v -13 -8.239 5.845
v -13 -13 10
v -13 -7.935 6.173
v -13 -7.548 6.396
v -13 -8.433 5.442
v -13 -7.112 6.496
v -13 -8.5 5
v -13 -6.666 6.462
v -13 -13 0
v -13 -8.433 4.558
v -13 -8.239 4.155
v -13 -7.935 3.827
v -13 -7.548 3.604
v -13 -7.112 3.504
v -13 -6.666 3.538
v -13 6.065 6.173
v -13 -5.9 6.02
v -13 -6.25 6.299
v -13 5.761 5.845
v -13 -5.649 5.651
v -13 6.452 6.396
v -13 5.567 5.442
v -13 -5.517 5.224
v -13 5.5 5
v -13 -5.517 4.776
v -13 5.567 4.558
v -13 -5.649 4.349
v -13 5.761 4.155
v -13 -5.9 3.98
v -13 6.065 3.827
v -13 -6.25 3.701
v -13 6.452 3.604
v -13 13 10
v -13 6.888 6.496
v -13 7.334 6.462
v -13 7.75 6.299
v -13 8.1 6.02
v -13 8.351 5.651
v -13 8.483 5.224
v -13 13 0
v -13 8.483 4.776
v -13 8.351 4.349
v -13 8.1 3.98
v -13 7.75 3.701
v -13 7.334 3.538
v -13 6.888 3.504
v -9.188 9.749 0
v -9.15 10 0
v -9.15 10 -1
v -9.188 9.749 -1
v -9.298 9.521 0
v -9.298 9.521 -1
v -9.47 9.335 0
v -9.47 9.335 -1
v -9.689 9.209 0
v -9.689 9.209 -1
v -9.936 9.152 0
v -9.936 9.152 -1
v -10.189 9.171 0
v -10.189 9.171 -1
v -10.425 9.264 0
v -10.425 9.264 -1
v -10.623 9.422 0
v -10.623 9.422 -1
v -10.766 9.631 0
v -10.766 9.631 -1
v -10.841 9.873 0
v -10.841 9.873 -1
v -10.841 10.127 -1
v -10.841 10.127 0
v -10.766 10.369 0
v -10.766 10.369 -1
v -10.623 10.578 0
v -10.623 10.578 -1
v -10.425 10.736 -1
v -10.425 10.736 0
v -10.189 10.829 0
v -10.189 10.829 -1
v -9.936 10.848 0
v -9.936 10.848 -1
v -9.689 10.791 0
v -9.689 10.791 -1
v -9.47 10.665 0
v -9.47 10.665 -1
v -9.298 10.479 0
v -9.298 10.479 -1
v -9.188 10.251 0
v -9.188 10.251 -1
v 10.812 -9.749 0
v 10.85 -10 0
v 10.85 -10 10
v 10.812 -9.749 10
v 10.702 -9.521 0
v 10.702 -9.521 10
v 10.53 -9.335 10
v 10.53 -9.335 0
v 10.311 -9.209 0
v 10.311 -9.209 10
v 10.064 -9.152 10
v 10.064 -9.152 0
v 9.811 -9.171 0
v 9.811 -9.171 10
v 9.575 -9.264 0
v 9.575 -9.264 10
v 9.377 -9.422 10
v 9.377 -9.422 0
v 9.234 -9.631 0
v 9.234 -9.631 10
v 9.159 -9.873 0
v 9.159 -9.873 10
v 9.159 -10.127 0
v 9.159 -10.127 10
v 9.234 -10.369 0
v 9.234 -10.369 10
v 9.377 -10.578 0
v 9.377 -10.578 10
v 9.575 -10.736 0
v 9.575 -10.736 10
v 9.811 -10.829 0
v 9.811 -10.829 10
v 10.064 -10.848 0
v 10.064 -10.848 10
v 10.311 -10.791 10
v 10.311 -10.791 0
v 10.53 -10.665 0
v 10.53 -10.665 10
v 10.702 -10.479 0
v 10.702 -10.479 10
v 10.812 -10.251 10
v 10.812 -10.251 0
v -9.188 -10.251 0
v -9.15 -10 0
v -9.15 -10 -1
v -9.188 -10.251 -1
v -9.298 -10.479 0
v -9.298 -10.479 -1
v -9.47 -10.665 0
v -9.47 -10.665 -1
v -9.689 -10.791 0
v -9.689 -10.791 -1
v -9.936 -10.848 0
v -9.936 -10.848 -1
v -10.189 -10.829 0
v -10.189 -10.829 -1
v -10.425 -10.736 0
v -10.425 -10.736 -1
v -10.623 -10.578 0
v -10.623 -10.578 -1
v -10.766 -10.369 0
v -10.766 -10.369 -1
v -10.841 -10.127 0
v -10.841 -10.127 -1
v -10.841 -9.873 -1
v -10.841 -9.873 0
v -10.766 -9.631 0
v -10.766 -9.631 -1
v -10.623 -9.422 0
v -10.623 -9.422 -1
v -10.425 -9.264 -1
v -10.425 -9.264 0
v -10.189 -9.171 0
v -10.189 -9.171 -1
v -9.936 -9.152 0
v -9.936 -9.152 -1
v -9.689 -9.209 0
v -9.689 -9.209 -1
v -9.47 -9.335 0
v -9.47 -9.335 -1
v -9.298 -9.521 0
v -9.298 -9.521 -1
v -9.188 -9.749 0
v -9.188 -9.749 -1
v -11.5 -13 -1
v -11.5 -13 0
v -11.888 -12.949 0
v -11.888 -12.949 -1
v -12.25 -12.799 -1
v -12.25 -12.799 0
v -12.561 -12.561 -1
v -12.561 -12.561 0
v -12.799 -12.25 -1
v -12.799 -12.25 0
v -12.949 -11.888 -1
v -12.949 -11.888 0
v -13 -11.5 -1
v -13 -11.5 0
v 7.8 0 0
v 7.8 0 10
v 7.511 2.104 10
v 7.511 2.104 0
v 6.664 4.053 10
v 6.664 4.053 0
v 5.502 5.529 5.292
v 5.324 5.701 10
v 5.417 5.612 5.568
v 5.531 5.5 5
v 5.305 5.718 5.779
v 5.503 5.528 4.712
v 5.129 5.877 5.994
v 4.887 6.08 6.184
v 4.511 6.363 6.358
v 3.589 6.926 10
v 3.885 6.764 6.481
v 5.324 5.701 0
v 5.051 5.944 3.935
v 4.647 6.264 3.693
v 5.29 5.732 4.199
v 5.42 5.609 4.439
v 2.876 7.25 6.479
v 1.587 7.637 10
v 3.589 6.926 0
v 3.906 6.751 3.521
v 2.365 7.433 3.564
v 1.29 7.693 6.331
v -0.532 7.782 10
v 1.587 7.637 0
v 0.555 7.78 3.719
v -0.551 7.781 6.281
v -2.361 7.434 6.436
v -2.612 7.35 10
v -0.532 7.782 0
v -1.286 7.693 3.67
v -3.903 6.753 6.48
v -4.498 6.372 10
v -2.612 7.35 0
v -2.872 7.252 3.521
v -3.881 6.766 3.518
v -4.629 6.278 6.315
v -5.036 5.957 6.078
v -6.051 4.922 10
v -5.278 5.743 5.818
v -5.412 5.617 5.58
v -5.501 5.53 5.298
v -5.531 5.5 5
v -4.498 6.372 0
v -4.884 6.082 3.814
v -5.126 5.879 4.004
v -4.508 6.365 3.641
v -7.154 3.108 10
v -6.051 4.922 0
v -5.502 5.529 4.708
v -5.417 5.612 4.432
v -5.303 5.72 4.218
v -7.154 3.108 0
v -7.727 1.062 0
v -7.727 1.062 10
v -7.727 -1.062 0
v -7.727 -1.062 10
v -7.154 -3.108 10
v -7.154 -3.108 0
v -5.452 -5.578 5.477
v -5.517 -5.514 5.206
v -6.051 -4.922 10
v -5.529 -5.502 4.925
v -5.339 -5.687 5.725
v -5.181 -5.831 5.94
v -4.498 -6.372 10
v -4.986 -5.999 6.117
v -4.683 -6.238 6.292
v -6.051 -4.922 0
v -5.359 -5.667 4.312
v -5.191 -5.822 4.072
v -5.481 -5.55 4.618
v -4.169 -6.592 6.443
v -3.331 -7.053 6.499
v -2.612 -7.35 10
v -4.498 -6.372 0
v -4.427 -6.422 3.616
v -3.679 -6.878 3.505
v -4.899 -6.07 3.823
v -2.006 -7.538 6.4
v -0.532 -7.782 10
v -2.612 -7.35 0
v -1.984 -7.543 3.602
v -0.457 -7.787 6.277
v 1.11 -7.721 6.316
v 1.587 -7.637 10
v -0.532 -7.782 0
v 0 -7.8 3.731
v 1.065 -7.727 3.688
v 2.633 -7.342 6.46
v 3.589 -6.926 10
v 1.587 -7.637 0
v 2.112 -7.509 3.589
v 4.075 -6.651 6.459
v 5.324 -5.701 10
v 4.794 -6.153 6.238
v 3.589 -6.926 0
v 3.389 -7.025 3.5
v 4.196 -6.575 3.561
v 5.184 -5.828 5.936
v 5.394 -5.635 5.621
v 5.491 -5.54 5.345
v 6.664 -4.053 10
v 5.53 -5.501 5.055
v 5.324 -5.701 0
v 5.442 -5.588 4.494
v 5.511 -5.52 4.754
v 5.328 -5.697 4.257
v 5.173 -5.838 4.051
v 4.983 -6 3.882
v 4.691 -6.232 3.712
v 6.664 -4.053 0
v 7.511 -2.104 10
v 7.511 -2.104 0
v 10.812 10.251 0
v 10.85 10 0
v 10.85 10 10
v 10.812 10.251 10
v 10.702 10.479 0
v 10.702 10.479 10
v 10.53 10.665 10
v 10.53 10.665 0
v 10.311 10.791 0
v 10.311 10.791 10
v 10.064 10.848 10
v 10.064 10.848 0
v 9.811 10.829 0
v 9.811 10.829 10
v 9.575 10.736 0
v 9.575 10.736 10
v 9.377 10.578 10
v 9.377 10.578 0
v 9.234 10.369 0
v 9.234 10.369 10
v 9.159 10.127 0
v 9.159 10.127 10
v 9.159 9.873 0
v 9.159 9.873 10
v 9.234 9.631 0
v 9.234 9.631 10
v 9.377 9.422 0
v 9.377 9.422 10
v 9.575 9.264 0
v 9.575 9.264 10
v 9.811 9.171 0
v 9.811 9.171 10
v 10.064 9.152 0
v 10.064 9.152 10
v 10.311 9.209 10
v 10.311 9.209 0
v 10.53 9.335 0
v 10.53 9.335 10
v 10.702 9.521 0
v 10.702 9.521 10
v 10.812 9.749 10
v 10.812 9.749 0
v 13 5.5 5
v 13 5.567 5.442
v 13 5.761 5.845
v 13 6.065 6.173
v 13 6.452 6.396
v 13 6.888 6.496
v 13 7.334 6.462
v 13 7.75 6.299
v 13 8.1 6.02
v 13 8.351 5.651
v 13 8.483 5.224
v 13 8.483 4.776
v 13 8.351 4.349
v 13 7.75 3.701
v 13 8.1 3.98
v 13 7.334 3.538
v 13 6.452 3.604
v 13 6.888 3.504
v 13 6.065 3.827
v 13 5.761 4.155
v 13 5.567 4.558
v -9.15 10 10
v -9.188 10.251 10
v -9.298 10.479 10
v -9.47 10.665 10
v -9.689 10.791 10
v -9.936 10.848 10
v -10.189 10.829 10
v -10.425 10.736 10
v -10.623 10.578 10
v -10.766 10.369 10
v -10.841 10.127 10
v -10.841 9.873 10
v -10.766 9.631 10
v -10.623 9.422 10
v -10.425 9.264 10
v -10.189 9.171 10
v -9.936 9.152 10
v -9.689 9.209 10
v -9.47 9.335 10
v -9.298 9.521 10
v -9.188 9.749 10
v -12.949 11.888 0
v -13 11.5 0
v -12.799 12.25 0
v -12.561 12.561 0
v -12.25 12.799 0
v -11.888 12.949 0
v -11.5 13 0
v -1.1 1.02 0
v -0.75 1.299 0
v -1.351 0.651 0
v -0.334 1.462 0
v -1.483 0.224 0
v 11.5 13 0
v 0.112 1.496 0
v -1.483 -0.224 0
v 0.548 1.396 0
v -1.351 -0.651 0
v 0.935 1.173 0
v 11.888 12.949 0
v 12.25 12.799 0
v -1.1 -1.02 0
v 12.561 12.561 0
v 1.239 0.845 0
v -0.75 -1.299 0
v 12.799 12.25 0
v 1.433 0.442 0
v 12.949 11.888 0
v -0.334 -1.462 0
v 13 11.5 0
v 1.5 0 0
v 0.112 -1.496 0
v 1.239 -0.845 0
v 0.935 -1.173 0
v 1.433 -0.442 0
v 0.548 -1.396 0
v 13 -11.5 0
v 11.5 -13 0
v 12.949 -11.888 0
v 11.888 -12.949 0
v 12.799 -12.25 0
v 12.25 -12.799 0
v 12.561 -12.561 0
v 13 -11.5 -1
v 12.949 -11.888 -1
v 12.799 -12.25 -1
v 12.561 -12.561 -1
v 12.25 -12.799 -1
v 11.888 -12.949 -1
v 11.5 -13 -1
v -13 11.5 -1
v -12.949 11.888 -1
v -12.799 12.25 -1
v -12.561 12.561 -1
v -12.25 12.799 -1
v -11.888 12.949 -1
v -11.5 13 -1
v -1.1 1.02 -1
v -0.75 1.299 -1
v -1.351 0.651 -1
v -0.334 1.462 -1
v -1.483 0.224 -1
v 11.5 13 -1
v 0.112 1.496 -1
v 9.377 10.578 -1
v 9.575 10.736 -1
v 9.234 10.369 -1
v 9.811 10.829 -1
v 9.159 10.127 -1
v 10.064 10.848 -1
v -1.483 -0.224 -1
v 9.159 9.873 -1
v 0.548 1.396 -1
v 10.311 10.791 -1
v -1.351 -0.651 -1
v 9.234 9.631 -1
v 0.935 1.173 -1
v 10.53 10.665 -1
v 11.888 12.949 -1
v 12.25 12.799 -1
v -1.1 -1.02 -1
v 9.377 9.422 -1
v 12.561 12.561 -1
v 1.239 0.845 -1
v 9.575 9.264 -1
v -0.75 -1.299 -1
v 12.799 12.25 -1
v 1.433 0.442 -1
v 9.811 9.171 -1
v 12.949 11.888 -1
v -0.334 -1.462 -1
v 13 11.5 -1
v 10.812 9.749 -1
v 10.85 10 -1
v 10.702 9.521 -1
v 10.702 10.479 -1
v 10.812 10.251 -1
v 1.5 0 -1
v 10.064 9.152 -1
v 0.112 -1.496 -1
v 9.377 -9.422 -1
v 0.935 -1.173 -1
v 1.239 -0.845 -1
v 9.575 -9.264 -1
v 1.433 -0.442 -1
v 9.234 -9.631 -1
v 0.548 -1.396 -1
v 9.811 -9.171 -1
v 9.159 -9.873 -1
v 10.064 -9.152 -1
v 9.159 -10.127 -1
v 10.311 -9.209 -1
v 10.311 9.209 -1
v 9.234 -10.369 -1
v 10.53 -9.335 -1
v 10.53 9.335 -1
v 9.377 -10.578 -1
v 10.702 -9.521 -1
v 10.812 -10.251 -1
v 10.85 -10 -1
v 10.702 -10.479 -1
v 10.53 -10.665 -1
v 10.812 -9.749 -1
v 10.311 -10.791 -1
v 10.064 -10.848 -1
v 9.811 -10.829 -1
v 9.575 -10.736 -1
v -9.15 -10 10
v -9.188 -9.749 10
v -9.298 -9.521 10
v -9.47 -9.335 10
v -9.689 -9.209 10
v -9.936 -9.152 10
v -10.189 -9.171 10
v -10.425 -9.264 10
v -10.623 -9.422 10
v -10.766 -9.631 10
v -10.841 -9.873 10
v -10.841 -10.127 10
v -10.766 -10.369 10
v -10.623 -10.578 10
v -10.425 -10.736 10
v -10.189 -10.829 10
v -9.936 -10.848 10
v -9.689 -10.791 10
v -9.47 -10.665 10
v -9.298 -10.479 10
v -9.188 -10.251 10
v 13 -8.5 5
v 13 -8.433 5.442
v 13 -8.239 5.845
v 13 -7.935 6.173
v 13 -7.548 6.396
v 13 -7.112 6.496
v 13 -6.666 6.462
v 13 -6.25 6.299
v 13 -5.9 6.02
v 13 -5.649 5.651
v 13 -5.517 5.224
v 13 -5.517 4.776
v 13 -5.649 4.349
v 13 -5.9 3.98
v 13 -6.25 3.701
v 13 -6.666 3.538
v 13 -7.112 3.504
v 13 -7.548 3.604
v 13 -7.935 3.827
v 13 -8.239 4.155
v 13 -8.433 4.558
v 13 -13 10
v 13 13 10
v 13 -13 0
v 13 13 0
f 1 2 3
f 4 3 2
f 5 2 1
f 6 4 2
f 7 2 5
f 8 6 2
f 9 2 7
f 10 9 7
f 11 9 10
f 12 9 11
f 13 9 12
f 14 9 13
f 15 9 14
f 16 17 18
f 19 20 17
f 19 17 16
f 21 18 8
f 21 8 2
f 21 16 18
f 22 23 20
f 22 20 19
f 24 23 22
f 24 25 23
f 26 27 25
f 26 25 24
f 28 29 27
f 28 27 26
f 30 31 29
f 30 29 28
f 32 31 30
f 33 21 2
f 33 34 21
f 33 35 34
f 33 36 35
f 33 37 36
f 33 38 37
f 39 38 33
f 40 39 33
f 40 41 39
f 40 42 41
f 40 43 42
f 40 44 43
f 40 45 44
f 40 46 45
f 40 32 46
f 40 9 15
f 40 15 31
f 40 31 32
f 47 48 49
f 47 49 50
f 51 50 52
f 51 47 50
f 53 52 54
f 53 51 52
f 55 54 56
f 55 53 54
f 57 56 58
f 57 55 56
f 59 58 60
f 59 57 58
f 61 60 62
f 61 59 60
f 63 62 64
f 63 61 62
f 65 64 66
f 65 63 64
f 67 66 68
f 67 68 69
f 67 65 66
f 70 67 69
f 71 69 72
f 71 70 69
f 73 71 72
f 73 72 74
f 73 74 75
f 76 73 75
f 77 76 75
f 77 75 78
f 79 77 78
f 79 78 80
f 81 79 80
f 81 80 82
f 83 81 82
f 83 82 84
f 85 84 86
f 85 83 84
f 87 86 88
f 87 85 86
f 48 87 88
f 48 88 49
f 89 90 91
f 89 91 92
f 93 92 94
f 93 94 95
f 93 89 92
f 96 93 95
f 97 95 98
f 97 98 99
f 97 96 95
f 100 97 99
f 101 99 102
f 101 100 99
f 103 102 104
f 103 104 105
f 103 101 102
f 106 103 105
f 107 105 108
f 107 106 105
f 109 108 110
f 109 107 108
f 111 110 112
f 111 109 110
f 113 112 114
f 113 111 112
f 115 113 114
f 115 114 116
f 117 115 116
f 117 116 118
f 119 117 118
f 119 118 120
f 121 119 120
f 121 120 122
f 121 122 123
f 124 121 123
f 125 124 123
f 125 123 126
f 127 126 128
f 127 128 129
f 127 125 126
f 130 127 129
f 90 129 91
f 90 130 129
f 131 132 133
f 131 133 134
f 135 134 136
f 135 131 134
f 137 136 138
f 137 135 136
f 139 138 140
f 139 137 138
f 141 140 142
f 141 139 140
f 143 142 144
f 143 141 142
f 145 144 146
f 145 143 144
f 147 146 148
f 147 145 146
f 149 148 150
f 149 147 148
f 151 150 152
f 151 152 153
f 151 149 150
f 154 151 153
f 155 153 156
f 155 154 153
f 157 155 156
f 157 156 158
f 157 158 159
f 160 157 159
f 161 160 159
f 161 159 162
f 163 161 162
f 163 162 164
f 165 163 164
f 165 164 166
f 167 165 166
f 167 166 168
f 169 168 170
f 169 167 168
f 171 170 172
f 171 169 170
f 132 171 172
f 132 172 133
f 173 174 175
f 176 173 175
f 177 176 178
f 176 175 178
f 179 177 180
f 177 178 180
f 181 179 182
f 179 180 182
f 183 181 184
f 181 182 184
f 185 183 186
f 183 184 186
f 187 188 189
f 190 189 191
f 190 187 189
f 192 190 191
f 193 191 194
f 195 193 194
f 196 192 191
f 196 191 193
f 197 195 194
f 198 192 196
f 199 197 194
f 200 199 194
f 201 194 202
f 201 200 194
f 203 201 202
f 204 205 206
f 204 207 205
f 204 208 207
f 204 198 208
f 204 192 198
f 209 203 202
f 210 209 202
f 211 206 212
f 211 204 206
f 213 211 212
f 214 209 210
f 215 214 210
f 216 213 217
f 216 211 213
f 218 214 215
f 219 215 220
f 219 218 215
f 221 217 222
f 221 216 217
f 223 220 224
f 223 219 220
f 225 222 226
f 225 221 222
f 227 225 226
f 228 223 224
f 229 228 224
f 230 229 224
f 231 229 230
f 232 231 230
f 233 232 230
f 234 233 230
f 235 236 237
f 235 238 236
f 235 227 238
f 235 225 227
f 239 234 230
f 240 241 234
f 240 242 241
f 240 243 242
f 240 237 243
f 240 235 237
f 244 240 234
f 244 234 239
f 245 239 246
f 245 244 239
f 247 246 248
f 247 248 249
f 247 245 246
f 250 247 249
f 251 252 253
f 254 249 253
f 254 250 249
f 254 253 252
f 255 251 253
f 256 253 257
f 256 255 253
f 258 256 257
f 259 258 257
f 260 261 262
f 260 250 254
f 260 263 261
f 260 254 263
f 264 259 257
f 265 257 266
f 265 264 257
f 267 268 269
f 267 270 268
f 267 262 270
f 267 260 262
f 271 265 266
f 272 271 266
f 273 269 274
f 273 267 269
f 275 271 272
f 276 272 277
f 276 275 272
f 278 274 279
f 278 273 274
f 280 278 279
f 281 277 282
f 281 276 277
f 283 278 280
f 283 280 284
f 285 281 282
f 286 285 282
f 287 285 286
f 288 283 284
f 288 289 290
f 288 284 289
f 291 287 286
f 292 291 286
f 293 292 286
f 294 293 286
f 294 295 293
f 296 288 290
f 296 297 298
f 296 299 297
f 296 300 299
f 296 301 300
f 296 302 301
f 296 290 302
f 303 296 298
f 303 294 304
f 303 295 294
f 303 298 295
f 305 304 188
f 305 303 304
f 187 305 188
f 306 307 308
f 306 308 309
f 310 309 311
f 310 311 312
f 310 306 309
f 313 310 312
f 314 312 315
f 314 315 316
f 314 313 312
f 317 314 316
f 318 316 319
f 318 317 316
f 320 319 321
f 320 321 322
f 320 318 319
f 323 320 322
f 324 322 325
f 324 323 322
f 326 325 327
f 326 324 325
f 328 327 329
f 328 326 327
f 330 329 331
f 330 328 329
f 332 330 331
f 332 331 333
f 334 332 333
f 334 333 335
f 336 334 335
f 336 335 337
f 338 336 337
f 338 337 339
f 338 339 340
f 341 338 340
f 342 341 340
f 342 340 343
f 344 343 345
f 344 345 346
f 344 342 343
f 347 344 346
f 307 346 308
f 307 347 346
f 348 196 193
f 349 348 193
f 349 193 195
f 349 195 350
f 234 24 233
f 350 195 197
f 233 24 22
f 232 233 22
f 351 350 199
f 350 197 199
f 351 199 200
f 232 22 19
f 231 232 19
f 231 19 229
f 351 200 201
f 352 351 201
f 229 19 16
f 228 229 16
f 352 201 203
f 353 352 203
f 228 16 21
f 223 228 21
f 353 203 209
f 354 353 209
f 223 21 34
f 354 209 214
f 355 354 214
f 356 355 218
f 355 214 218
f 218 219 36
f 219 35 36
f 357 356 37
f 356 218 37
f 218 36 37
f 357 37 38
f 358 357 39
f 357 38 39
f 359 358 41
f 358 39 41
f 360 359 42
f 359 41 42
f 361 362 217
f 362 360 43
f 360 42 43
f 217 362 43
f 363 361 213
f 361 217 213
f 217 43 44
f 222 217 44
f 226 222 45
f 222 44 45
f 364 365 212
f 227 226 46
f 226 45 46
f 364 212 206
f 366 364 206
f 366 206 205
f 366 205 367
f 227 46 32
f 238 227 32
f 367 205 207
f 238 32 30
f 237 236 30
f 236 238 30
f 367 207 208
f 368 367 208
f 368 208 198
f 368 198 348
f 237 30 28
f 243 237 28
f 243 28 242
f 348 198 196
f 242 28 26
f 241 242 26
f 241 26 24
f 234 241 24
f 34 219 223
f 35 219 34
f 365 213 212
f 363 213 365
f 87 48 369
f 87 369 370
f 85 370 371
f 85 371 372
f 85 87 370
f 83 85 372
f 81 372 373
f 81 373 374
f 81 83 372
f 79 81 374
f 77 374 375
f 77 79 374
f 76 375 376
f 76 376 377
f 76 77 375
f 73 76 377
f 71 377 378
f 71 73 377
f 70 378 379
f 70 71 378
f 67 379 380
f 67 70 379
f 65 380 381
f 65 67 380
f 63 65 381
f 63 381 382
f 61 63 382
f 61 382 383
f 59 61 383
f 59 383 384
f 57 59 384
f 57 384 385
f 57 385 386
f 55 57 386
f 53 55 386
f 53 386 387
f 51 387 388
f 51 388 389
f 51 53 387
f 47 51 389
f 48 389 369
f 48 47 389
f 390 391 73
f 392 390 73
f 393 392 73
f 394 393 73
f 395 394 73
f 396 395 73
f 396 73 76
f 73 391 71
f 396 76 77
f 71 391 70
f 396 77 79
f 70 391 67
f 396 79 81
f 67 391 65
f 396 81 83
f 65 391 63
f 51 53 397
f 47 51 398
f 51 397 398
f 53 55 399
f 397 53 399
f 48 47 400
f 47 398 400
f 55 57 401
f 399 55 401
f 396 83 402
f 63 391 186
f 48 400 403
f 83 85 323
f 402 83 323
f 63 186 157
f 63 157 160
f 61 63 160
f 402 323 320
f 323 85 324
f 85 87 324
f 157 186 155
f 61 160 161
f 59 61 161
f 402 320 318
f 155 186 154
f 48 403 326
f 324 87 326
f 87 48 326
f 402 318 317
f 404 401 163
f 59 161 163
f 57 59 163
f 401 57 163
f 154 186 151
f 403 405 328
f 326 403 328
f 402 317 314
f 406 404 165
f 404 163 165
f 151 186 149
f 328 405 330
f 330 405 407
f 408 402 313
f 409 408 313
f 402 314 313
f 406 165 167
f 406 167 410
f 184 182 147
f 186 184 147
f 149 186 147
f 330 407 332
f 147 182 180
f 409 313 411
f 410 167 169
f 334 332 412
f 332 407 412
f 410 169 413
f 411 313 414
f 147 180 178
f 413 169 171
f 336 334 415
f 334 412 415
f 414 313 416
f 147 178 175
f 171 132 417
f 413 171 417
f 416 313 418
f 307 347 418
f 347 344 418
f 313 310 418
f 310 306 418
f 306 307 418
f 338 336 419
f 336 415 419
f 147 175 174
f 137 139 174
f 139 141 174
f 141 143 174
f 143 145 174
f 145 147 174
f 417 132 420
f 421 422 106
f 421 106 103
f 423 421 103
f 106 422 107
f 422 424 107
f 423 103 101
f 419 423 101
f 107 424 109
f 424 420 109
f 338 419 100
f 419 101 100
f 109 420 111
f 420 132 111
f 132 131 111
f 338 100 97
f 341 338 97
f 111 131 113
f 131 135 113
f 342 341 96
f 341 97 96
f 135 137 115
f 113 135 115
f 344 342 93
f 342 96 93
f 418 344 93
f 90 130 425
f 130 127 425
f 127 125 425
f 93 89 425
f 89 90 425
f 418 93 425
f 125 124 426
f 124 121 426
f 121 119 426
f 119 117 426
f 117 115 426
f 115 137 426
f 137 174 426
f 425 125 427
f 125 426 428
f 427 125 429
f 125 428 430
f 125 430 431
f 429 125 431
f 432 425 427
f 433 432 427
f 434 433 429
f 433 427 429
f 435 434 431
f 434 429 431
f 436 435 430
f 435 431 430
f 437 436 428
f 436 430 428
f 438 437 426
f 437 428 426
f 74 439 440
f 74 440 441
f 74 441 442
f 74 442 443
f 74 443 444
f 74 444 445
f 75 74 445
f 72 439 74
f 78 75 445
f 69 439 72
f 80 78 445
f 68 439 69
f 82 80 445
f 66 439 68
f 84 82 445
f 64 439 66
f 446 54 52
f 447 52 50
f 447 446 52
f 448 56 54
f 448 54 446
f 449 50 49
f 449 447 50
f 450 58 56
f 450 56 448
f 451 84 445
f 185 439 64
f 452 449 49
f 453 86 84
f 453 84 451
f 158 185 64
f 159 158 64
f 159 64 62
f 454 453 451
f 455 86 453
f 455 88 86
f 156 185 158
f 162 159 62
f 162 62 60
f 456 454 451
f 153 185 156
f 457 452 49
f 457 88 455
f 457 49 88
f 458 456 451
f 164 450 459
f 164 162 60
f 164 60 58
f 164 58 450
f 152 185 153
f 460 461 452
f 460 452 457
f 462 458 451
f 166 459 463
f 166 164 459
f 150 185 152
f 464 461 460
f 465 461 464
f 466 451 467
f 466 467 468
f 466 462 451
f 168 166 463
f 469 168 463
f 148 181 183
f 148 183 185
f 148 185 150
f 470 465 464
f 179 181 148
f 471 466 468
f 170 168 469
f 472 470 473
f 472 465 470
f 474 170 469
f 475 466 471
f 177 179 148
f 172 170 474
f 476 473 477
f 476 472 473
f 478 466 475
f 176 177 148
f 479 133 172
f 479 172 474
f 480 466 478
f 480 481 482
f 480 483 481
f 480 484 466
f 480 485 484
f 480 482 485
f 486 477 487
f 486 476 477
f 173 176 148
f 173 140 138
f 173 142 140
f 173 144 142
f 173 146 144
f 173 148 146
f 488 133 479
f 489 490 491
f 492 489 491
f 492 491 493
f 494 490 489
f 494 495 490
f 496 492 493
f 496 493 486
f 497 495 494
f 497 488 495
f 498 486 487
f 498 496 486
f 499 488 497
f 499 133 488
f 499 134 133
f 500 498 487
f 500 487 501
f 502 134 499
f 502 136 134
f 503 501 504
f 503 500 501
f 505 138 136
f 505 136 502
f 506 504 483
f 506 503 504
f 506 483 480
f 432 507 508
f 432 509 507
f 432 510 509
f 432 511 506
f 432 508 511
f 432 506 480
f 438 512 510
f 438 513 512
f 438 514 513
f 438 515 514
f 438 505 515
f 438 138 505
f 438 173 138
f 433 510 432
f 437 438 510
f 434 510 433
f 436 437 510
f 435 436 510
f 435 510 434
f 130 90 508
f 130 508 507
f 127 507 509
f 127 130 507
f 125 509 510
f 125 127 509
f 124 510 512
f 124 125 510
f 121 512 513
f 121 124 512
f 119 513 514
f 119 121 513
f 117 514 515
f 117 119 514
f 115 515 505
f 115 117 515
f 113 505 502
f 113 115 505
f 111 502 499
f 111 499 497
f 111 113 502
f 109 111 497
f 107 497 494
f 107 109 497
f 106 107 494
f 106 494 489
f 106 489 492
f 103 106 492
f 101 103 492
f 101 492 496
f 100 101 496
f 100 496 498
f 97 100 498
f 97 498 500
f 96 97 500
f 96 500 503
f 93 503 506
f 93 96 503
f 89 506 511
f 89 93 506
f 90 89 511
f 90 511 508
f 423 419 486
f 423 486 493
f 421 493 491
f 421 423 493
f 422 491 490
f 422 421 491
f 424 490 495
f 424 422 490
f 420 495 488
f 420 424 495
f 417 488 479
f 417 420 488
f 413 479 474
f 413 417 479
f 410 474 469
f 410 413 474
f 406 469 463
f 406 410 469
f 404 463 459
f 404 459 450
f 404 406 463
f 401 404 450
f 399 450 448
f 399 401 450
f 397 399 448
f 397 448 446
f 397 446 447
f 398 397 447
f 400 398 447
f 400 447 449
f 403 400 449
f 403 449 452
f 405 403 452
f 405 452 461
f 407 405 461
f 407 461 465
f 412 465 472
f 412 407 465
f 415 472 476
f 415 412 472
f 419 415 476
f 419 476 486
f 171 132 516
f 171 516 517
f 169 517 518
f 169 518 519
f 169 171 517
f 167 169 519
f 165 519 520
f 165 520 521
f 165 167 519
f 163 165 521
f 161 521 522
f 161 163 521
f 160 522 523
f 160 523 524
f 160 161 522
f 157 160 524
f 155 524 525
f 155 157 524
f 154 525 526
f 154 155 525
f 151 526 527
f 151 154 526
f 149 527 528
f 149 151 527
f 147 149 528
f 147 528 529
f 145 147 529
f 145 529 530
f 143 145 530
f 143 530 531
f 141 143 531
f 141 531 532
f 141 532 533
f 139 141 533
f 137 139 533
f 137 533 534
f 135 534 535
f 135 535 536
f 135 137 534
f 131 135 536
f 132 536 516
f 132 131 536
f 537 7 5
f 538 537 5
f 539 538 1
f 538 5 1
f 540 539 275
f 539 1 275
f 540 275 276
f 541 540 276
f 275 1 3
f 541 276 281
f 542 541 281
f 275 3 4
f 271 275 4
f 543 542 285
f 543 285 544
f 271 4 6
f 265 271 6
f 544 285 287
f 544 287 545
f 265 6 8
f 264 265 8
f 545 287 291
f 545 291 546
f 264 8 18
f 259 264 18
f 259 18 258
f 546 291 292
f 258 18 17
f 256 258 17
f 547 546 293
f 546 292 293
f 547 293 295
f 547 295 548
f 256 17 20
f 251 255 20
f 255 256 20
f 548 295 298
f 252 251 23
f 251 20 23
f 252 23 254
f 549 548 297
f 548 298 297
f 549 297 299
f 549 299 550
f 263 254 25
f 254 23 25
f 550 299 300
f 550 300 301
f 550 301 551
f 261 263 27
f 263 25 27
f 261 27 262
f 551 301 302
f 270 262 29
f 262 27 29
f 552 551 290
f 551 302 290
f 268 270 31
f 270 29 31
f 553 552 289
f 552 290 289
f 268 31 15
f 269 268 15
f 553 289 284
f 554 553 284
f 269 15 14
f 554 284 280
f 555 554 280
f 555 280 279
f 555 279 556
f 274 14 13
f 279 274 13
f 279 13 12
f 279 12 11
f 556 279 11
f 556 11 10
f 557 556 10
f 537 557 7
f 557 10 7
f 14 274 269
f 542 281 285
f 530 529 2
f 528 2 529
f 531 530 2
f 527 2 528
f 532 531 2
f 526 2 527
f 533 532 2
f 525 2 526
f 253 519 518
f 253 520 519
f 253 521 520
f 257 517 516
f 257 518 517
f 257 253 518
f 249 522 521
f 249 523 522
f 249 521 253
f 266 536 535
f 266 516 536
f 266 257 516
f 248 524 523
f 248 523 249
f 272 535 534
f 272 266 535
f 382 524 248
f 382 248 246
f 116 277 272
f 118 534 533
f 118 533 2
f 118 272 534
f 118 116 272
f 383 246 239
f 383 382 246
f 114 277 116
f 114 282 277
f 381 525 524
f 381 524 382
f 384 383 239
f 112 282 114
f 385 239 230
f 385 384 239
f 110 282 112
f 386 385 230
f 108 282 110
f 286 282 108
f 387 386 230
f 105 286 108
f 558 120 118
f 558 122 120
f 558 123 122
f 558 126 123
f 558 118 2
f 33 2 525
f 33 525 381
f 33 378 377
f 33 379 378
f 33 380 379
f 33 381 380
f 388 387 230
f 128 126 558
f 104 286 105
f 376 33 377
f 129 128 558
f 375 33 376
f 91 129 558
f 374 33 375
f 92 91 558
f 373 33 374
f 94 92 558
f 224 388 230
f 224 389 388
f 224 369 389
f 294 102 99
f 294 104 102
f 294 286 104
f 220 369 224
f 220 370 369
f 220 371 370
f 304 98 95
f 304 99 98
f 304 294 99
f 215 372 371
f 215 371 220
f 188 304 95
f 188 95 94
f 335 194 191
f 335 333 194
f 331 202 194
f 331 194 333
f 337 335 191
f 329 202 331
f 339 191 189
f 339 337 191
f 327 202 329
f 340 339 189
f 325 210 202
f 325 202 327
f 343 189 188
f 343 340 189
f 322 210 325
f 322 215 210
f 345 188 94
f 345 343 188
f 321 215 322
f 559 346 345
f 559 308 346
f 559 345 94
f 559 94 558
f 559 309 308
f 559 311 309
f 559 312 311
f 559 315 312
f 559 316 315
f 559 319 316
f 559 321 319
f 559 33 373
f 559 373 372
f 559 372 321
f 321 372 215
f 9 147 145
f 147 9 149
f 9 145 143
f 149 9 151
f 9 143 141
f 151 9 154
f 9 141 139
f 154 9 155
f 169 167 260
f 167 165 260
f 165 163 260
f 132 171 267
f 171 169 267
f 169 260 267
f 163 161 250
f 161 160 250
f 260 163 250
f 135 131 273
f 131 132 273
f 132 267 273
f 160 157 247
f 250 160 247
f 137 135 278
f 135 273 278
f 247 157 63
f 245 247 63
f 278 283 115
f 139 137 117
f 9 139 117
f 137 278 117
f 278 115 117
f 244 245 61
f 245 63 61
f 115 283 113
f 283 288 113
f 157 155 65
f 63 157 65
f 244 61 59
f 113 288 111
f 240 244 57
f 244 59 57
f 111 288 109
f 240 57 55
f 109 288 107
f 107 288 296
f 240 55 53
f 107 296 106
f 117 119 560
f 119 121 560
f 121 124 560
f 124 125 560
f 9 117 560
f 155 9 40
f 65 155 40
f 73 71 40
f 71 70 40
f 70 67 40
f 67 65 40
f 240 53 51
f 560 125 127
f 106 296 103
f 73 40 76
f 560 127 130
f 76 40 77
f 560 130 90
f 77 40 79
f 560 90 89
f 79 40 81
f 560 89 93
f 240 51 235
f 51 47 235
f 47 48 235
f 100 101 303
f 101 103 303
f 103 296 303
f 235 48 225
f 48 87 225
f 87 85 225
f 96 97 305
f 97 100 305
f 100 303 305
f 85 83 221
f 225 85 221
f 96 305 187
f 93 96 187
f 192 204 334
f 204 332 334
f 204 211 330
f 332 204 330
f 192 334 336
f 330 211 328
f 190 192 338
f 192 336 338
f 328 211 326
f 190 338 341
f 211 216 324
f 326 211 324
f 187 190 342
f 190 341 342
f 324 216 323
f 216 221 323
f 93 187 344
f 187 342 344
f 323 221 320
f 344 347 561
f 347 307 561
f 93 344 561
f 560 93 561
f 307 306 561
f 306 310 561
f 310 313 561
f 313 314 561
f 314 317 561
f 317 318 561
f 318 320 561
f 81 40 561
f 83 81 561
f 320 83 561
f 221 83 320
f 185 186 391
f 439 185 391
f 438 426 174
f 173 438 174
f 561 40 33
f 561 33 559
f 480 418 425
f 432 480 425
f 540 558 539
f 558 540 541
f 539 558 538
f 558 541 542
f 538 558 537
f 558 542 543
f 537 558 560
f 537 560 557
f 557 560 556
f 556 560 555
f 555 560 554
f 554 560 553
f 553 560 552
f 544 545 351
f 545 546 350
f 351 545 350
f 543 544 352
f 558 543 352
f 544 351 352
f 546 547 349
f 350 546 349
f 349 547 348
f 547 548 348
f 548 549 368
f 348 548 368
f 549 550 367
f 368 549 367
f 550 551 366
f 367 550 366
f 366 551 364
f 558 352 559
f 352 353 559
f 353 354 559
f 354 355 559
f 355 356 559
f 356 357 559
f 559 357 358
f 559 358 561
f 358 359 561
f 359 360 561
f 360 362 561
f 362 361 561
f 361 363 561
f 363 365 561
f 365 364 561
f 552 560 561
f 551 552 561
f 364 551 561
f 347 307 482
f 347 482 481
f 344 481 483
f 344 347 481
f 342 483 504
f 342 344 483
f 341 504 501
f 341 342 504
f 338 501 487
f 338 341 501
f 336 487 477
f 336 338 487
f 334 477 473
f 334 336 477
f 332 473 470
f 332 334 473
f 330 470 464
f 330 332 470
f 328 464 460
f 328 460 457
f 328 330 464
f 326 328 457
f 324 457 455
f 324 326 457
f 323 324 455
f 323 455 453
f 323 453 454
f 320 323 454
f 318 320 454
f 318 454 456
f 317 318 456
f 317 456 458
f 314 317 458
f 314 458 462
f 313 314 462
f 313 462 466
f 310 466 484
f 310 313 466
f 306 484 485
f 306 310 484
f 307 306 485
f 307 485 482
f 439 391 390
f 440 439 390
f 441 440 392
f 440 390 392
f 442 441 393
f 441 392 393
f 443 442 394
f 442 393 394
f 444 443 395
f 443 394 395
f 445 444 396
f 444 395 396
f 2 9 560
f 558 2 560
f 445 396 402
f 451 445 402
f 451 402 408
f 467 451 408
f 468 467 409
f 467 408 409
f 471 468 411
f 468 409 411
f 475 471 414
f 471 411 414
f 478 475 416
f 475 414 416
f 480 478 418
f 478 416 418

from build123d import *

# Parameters (mm, degrees)
F0_W     = 26
F0_H     = 26
F0_R     = 0.85
F0_R_2   = 7.8
F1_DEPTH = 10
F2_R     = 1.5
F3_DEPTH = 26.001
F4_R     = 0.85
F4_R_2   = 7.8
F4_R_3   = 1.5
F5_DEPTH = 1


with BuildPart() as f1:
    # F0 (on Top) → F1 (new body)
    with BuildSketch(Plane.XY):
        Rectangle(F0_W, F0_H)
        with Locations((-10, -10)):
            Circle(F0_R, mode=Mode.SUBTRACT)
        with Locations((10, -10)):
            Circle(F0_R, mode=Mode.SUBTRACT)
        with Locations((-10, 10)):
            Circle(F0_R, mode=Mode.SUBTRACT)
        Circle(F0_R_2, mode=Mode.SUBTRACT)
        with Locations((10, 10)):
            Circle(F0_R, mode=Mode.SUBTRACT)
    extrude(amount=F1_DEPTH)

    # F2 (on face) → F3 (cut, through all)
    with BuildSketch(Plane(origin=(-13, 0, 0), x_dir=(0, -1, 0), z_dir=(-1, 0, 0))):
        with Locations((-7, 5)):
            Circle(F2_R)
        with Locations((7, 5)):
            Circle(F2_R)
    extrude(amount=-F3_DEPTH, mode=Mode.SUBTRACT)


with BuildPart() as f5:
    # F4 (on face) → F5 (new body)
    with BuildSketch(Plane(origin=(0, 0, 0), x_dir=(1, 0, 0), z_dir=(0, 0, -1))):
        with BuildLine():
            ThreePointArc((-11.5, 13), (-12.5606601718, 12.5606601718), (-13, 11.5))
            Line((-13, 11.5), (-13, -11.5))
            ThreePointArc((-13, -11.5), (-12.5606601718, -12.5606601718), (-11.5, -13))
            Line((-11.5, -13), (11.5, -13))
            ThreePointArc((11.5, -13), (12.5606601718, -12.5606601718), (13, -11.5))
            Line((13, -11.5), (13, 11.5))
            ThreePointArc((13, 11.5), (12.5606601718, 12.5606601718), (11.5, 13))
            Line((11.5, 13), (-11.5, 13))
        make_face()
        with Locations((-10, -10)):
            Circle(F4_R, mode=Mode.SUBTRACT)
        with Locations((10, -10)):
            Circle(F4_R, mode=Mode.SUBTRACT)
        with Locations((-10, 10)):
            Circle(F4_R, mode=Mode.SUBTRACT)
        Circle(F4_R_2, mode=Mode.SUBTRACT)
        with Locations((10, 10)):
            Circle(F4_R, mode=Mode.SUBTRACT)
        Circle(F4_R_2)
        Circle(F4_R_3, mode=Mode.SUBTRACT)
    extrude(amount=F5_DEPTH)


solid = Compound([f1.part, f5.part])
